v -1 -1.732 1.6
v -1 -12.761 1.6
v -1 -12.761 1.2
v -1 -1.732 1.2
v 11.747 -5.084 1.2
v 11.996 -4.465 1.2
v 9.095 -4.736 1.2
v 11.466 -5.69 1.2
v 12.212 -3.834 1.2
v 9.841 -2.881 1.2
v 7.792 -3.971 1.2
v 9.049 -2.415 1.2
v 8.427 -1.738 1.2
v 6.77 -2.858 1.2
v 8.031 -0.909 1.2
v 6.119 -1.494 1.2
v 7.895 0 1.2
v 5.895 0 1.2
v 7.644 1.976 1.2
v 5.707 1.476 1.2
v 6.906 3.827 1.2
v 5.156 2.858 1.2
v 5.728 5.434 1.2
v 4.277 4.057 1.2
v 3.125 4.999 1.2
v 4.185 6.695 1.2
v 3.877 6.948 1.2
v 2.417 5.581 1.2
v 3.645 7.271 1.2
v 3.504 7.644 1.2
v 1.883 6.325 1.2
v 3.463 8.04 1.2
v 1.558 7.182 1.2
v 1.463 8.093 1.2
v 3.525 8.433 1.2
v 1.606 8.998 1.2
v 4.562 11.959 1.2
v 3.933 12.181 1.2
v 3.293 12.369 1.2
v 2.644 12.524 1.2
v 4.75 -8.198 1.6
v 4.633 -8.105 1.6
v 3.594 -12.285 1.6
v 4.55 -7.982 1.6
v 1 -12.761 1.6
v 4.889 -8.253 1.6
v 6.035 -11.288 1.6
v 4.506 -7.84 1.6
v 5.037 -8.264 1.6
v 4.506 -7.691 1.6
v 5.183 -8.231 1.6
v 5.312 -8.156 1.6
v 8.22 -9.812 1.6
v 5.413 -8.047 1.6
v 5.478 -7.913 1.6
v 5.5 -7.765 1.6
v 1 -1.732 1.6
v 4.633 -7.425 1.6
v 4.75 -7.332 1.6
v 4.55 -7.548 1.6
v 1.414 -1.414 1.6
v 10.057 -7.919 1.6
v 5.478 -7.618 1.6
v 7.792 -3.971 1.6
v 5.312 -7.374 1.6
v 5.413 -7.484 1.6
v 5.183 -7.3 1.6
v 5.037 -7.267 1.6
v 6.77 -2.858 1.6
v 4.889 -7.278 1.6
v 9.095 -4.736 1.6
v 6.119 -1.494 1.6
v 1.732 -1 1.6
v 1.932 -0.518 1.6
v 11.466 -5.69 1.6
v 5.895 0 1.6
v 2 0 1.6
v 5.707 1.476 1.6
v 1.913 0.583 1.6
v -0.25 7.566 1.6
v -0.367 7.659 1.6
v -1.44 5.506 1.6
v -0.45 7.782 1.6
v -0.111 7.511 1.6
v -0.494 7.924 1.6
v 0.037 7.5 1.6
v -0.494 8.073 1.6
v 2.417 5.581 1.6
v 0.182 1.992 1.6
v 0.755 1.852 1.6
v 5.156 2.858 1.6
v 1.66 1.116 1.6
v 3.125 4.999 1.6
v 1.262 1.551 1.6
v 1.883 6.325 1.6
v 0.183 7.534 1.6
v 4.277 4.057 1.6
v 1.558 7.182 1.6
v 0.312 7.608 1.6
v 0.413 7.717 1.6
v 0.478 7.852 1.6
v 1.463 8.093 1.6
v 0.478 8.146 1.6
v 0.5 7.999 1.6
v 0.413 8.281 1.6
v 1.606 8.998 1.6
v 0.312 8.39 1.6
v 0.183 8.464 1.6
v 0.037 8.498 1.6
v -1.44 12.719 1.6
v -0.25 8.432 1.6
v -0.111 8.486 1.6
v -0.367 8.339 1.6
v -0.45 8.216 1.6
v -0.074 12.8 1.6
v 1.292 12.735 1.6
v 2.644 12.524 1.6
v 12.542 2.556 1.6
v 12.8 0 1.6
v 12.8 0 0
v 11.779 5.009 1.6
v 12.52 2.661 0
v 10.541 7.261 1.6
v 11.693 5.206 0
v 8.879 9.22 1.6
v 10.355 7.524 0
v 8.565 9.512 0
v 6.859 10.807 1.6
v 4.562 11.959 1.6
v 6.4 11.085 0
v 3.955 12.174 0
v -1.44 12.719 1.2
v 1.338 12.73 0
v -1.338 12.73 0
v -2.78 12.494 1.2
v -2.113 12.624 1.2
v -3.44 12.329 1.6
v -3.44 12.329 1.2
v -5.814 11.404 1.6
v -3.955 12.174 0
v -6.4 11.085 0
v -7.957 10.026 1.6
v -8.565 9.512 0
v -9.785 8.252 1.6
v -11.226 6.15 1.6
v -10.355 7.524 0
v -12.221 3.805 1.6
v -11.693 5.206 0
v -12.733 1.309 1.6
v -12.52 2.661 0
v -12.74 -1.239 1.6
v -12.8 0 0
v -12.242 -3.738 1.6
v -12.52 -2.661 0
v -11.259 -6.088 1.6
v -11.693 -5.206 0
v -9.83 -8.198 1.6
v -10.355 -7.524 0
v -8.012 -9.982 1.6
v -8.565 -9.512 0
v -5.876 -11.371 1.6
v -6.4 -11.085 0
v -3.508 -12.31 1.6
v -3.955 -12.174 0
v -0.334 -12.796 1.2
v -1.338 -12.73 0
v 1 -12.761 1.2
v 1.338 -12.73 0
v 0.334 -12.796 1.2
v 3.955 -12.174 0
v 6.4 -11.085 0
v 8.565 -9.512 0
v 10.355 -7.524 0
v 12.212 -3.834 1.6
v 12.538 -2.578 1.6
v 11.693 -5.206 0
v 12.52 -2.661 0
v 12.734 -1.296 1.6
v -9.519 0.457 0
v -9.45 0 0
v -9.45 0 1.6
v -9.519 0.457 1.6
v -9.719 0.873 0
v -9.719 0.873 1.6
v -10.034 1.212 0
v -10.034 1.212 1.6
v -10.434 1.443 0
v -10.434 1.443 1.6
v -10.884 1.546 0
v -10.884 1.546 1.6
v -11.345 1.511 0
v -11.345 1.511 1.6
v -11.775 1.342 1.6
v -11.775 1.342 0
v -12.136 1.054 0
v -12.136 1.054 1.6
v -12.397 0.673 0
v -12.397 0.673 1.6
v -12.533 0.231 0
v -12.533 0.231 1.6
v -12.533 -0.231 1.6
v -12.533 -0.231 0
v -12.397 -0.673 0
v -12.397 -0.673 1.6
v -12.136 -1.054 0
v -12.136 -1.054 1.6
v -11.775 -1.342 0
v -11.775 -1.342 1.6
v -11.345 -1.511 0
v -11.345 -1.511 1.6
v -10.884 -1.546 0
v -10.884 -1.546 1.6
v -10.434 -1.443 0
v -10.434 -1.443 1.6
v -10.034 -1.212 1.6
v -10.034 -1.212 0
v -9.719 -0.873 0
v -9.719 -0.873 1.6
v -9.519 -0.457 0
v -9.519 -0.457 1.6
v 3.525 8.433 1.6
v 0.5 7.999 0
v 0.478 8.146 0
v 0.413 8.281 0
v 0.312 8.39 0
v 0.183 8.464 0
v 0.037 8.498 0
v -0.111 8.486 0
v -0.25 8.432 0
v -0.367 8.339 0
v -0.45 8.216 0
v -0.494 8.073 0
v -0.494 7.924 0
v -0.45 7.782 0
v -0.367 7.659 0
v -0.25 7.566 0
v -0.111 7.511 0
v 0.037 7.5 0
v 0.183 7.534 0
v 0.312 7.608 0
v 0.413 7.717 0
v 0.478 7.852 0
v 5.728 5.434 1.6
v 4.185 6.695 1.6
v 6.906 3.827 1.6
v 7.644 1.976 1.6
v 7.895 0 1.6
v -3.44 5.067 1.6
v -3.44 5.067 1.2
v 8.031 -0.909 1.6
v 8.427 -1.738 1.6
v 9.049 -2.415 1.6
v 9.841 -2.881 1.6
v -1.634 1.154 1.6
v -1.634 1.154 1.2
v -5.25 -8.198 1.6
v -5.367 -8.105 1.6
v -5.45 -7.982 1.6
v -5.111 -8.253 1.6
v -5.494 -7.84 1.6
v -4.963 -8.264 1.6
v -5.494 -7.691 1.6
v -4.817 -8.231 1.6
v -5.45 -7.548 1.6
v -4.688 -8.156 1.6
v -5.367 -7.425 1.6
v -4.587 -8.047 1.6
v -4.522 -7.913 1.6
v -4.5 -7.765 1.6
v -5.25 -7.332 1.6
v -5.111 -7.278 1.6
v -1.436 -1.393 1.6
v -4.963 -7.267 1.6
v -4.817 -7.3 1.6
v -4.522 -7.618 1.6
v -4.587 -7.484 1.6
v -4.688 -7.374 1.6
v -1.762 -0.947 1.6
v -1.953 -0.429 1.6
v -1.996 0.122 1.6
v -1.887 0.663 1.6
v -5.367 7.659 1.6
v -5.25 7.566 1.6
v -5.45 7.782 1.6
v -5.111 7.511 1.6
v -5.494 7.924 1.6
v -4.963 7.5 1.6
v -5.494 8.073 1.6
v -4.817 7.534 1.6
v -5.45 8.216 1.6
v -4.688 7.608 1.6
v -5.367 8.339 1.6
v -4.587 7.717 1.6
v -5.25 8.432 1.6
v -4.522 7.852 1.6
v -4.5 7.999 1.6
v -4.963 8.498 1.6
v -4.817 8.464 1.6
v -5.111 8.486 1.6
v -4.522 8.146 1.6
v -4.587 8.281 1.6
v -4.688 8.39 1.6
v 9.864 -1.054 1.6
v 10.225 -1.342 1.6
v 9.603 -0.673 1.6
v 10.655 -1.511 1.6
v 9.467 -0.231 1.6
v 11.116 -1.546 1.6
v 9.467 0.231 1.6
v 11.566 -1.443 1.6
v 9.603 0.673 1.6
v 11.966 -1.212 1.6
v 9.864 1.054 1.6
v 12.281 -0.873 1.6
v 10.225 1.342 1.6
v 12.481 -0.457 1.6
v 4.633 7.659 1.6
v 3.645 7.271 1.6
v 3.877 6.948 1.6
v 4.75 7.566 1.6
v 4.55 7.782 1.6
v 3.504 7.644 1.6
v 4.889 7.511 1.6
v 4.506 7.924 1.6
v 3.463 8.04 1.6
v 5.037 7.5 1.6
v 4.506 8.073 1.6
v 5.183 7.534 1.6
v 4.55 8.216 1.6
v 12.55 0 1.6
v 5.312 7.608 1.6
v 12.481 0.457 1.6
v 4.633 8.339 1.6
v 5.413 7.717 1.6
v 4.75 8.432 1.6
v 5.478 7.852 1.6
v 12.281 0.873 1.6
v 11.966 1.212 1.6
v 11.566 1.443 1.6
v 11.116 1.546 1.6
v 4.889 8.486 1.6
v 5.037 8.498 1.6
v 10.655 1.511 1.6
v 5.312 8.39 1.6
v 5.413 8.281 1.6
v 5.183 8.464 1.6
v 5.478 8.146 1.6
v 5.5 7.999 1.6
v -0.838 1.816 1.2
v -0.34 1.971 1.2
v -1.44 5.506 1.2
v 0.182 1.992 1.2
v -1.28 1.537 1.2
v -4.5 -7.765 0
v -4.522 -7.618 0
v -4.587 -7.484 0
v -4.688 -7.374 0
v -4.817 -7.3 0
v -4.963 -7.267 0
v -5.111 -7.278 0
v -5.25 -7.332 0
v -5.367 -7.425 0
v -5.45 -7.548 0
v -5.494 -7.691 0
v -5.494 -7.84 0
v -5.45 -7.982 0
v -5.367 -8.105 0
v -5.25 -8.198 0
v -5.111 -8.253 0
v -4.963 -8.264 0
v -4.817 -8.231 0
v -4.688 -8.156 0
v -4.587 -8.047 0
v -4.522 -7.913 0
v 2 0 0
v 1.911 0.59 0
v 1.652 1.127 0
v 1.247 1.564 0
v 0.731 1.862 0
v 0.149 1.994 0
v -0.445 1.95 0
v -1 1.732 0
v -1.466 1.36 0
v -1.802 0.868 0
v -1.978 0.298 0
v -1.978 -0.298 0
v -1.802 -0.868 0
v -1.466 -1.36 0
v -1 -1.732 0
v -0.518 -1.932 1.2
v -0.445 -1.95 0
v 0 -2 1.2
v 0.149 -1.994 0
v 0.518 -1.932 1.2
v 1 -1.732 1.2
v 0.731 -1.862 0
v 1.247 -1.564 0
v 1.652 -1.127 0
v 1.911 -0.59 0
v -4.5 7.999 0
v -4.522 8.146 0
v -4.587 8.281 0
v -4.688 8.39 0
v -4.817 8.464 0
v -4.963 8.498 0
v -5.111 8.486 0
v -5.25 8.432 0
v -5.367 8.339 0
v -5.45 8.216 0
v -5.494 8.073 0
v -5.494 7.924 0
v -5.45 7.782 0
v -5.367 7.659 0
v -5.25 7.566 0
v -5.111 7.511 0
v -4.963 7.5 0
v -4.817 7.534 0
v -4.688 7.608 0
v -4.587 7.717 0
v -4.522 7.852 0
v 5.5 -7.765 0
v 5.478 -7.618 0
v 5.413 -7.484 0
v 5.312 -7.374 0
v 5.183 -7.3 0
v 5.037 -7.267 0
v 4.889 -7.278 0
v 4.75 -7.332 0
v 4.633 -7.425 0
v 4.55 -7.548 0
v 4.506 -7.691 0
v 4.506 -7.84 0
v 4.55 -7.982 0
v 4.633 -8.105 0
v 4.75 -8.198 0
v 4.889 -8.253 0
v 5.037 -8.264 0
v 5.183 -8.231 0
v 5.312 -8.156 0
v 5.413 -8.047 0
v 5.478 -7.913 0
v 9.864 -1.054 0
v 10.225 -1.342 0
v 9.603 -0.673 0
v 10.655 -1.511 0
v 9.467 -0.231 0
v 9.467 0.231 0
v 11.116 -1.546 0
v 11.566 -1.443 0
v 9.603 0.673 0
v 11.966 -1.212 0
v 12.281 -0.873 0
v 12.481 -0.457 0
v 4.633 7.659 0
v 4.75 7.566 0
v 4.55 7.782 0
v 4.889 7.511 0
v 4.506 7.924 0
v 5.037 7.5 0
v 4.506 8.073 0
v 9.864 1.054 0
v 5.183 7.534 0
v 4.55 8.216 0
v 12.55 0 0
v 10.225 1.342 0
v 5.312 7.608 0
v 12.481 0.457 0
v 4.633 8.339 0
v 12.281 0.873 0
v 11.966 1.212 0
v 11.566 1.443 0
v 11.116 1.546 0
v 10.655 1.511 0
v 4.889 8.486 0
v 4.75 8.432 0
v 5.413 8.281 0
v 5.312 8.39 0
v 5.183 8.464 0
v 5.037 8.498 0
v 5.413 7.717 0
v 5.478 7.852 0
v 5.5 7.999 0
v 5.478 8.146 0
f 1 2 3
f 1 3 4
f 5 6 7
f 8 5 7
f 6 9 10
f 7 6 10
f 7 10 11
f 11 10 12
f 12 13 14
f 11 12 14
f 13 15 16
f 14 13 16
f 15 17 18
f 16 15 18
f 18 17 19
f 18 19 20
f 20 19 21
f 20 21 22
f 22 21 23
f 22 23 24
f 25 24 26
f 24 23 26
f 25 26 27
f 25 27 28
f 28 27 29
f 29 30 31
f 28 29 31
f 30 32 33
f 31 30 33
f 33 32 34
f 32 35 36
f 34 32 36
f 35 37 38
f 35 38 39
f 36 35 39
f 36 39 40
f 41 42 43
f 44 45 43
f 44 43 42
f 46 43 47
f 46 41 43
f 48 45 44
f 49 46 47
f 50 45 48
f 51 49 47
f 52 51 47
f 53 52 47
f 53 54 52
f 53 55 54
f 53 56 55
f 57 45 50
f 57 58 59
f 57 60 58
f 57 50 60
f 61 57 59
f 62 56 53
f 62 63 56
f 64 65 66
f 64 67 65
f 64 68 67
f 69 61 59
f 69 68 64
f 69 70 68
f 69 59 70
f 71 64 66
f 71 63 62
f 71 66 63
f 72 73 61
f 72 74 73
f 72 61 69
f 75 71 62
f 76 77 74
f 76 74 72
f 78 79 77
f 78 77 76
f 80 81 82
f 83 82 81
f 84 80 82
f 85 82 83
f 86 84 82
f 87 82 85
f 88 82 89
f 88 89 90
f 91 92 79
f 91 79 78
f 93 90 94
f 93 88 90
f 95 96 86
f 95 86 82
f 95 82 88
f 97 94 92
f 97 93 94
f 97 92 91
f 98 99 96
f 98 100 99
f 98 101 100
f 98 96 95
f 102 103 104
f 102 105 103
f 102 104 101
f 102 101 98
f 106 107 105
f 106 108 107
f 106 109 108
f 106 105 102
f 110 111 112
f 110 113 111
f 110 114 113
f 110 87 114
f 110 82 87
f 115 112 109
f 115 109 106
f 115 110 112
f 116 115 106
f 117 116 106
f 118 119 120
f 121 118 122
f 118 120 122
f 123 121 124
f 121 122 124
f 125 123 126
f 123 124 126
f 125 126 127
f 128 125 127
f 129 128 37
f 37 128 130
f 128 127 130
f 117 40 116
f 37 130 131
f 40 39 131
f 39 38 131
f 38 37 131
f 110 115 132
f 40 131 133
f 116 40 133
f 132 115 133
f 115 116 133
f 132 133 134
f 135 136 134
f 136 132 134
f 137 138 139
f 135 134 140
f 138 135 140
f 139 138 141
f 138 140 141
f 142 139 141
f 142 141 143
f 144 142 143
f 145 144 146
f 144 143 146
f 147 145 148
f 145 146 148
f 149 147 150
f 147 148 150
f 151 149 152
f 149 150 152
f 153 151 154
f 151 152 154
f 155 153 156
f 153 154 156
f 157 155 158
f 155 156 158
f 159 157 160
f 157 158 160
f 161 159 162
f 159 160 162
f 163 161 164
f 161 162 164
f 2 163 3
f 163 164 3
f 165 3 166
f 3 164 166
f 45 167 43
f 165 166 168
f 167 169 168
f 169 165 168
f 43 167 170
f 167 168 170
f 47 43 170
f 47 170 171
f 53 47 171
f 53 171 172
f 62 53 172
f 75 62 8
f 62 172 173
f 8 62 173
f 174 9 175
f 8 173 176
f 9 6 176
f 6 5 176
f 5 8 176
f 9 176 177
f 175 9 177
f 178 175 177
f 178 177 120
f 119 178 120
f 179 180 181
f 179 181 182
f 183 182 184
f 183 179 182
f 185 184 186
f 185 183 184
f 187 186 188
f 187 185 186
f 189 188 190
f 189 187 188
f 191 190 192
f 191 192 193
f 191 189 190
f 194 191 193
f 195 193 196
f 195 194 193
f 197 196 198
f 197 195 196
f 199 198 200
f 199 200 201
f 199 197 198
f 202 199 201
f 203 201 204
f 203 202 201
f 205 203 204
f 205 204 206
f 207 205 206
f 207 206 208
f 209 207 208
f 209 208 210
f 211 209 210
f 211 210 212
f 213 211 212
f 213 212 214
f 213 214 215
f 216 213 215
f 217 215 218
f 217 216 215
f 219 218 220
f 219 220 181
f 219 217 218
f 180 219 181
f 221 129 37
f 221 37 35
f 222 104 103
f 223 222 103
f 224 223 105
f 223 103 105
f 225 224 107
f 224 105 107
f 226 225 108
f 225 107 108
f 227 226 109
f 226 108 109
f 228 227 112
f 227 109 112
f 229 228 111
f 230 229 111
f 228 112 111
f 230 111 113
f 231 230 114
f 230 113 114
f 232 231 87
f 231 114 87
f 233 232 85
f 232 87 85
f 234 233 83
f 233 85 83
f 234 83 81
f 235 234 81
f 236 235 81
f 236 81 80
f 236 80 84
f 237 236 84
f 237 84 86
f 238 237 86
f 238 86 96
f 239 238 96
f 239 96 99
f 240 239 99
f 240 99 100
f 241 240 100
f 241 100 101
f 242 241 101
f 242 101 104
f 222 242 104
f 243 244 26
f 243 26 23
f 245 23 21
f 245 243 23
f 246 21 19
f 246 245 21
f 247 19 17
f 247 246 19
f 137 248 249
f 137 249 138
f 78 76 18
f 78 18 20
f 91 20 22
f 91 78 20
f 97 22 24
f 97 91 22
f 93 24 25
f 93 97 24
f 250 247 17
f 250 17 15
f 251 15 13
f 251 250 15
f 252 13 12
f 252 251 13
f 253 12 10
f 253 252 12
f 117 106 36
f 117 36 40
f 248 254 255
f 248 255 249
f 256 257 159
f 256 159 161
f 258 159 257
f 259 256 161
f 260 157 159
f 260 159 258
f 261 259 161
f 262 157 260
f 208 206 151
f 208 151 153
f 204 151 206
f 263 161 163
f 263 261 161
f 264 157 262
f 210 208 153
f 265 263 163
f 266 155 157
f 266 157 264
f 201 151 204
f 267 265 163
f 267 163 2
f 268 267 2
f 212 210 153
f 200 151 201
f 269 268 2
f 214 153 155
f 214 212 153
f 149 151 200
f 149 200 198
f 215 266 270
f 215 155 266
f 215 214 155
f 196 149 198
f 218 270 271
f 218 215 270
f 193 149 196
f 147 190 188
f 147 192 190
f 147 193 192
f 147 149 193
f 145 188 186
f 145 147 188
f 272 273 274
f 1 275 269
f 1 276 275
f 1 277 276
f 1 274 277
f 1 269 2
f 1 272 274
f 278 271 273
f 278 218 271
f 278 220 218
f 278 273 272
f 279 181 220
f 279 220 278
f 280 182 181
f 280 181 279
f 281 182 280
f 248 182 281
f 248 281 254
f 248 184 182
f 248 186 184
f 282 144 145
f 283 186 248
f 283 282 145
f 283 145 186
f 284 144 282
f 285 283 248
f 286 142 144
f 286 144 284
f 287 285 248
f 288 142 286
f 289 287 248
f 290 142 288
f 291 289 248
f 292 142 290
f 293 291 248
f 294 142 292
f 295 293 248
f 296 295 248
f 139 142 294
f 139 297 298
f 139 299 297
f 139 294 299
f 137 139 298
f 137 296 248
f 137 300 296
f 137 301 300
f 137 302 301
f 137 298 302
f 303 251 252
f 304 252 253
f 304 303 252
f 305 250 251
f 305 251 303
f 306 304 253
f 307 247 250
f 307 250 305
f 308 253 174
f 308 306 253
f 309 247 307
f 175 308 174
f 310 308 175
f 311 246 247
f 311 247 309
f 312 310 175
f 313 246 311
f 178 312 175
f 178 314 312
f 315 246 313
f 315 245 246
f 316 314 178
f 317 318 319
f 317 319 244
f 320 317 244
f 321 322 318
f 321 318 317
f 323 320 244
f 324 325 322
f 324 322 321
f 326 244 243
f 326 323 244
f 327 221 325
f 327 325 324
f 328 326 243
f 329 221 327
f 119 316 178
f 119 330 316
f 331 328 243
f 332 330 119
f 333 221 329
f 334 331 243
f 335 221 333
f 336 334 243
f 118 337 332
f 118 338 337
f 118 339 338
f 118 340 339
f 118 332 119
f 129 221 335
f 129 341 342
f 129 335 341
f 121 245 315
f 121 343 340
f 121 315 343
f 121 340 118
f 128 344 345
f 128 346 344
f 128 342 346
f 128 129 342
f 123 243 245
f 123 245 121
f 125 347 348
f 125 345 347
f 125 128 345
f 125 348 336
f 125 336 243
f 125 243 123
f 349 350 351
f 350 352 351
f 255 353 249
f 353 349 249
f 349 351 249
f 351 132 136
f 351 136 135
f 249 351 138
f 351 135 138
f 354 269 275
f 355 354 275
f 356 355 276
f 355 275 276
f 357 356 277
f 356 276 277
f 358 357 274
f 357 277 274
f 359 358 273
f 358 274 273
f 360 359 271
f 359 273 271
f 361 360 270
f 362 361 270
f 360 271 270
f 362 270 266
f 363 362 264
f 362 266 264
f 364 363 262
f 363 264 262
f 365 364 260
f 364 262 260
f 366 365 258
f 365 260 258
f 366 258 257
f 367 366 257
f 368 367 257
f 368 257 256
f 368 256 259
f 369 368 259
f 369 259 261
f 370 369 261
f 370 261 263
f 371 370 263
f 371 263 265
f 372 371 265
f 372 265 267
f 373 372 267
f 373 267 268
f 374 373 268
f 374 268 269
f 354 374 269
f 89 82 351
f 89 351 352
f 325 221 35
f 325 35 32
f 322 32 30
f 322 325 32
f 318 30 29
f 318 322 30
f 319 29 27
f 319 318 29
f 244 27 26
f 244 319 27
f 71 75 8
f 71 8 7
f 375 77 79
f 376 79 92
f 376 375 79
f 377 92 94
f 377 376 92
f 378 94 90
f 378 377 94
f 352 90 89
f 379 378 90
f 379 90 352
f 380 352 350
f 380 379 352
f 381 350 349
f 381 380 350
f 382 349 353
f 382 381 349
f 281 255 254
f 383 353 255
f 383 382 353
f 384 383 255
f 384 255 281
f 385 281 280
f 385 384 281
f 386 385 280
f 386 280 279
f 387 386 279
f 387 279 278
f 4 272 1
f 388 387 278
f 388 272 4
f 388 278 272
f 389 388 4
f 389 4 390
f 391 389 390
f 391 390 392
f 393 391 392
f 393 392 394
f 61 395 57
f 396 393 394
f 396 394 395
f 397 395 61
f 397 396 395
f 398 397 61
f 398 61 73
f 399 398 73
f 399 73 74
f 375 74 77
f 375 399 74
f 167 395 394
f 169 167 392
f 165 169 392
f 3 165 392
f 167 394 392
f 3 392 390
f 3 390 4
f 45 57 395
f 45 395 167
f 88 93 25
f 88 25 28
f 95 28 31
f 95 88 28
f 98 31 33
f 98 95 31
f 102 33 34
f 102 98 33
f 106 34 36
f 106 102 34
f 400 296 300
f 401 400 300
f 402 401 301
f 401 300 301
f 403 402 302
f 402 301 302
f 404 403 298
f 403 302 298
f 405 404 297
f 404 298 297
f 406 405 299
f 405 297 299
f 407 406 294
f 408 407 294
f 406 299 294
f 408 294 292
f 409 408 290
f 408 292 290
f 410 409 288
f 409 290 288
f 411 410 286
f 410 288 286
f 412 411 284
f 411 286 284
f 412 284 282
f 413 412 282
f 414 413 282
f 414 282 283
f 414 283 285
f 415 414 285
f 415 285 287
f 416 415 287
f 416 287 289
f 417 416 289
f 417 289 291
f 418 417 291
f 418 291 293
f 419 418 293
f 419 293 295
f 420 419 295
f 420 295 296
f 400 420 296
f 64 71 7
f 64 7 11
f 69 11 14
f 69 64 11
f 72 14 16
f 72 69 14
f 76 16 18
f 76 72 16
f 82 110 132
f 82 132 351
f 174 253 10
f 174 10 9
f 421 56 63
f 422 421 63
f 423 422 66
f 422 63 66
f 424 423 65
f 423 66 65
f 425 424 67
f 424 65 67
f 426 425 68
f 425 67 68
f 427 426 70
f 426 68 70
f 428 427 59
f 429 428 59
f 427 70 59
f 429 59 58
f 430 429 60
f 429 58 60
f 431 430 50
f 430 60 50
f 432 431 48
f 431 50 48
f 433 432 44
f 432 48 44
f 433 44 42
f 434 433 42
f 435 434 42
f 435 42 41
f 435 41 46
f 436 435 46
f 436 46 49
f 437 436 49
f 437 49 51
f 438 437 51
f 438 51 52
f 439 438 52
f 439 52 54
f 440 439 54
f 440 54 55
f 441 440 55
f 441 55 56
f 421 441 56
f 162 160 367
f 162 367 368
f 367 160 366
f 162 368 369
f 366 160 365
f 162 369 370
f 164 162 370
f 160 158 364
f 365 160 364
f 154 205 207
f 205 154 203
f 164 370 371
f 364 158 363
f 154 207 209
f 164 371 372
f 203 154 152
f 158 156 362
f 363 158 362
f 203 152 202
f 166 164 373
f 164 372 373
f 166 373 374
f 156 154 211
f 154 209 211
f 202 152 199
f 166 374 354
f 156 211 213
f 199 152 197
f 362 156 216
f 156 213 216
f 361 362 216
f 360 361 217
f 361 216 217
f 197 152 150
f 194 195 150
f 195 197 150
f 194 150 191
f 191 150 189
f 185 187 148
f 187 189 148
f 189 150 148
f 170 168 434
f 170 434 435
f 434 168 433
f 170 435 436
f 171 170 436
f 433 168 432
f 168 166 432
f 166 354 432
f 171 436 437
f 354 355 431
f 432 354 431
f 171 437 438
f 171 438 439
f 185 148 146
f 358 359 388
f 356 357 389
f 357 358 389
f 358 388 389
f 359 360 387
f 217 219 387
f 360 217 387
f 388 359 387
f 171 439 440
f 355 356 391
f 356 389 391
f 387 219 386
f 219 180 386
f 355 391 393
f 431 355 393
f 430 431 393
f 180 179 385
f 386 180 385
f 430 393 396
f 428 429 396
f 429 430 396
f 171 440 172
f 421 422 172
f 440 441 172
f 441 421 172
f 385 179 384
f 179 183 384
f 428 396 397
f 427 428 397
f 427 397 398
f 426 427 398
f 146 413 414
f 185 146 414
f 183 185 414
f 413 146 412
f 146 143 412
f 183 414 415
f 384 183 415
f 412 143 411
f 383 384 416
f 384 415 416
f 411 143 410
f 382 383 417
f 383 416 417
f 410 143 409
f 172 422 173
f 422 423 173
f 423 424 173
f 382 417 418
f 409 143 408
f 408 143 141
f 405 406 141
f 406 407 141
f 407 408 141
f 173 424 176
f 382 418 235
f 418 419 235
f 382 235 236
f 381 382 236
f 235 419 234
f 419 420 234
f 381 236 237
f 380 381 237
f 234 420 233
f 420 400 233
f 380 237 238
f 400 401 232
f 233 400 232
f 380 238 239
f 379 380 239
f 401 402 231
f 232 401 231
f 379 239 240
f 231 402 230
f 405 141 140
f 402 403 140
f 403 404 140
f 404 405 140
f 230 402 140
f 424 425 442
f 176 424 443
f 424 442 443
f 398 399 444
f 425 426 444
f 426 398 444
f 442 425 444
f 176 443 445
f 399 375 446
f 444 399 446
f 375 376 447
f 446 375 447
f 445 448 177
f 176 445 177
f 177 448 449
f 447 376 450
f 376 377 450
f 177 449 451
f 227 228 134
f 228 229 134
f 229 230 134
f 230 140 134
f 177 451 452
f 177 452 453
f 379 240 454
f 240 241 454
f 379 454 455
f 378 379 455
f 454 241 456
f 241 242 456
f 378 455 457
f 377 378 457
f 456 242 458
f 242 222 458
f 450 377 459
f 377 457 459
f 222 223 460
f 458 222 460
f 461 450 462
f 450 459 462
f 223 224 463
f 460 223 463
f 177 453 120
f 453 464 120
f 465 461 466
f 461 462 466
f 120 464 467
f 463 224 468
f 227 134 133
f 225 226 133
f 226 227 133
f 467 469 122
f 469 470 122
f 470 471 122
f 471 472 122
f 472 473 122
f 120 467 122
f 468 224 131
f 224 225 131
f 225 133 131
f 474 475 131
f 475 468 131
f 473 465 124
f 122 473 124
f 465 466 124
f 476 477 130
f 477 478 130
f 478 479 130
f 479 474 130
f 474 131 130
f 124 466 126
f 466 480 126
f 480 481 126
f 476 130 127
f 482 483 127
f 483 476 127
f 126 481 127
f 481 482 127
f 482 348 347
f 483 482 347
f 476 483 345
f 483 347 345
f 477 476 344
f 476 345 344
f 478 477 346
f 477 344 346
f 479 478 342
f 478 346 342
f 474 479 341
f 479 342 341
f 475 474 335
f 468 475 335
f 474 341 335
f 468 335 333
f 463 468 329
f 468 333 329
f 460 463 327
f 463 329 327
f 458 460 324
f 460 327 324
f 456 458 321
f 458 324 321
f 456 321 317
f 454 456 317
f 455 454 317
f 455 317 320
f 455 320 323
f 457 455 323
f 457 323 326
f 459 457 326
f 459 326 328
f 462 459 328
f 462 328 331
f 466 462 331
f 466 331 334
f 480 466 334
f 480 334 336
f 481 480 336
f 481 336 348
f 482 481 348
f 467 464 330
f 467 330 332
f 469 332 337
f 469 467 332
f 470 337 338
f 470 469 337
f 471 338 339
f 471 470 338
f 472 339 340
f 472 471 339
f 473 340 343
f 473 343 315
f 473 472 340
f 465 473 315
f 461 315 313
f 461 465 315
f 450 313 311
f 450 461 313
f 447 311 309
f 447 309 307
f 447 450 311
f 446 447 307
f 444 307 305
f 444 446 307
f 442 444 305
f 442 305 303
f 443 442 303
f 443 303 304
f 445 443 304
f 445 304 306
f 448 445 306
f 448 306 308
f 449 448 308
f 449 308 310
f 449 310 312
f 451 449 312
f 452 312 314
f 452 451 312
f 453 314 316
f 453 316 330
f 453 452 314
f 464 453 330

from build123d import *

# Parameters (mm, degrees)
ESQUISSE1_R             = 12.8
ESQUISSE1_R_2           = 2
ESQUISSE1_R_3           = 1.55
BOSS_EXTRU_1_DEPTH      = 1.6
ESQUISSE2_R             = 0.5
ENL_V_MAT_EXTRU_1_DEPTH = 19.172506707
ENL_V_MAT_EXTRU_2_DEPTH = 0.4


with BuildPart() as part:
    # Esquisse1 → Boss.-Extru.1 (new body)
    with BuildSketch(Plane.XY):
        Circle(ESQUISSE1_R)
        Circle(ESQUISSE1_R_2, mode=Mode.SUBTRACT)
        with Locations((-11, 0)):
            Circle(ESQUISSE1_R_3, mode=Mode.SUBTRACT)
        with Locations((11, 0)):
            Circle(ESQUISSE1_R_3, mode=Mode.SUBTRACT)
    extrude(amount=BOSS_EXTRU_1_DEPTH)

    # Esquisse2 → Enlèv. mat.-Extru.1 (cut, through all)
    with BuildSketch(Plane.XY.offset(1.6)):
        with Locations((5, -7.765166341)):
            Circle(ESQUISSE2_R)
        with Locations((-5, -7.765166341)):
            Circle(ESQUISSE2_R)
        with Locations((0, 7.998956295)):
            Circle(ESQUISSE2_R)
        with Locations((5, 7.998956295)):
            Circle(ESQUISSE2_R)
        with Locations((-5, 7.998956295)):
            Circle(ESQUISSE2_R)
    extrude(amount=-ENL_V_MAT_EXTRU_1_DEPTH, mode=Mode.SUBTRACT)

    # Esquisse4 → Enlèv. mat.-Extru.2 (cut)
    with BuildSketch(Plane.XY.offset(1.6)):
        with BuildLine():
            Line((2.849870715, 13.22379947), (4.768486358, 12.659074744))
            Line((4.768486358, 12.659074744), (3.524647017, 8.433211229))
            ThreePointArc((3.524647017, 8.433211229), (3.562251348, 7.452950263), (4.184819655, 6.694837904))
            ThreePointArc((4.184819655, 6.694837904), (6.905555582, 3.827123228), (7.895161183, 0))
            ThreePointArc((7.895161183, 0), (8.427320022, -1.738200739), (9.8413761, -2.88055806))
            Line((9.8413761, -2.88055806), (13.173167165, -4.220677813))
            Line((13.173167165, -4.220677813), (12.426832835, -6.076206058))
            Line((12.426832835, -6.076206058), (9.09504177, -4.736086305))
            ThreePointArc((9.09504177, -4.736086305), (6.770113236, -2.857872865), (5.895161183, 0))
            ThreePointArc((5.895161183, 0), (5.156242193, 2.857637453), (3.124722322, 4.998903458))
            ThreePointArc((3.124722322, 4.998903458), (1.692538076, 6.742899364), (1.606031374, 8.997935955))
            Line((1.606031374, 8.997935955), (2.849870715, 13.22379947))
        make_face()
        Polygon((-3.439832578, 13.22379947), (-1.439832578, 13.22379947), (-1.439832578, 5.505940762), (1, 0.219636844), (1, -13.772678102), (-1, -13.772678102), (-1, -0.219636844), (-3.439832578, 5.066667074), align=None)
    extrude(amount=-ENL_V_MAT_EXTRU_2_DEPTH, mode=Mode.SUBTRACT)


solid = part.part
